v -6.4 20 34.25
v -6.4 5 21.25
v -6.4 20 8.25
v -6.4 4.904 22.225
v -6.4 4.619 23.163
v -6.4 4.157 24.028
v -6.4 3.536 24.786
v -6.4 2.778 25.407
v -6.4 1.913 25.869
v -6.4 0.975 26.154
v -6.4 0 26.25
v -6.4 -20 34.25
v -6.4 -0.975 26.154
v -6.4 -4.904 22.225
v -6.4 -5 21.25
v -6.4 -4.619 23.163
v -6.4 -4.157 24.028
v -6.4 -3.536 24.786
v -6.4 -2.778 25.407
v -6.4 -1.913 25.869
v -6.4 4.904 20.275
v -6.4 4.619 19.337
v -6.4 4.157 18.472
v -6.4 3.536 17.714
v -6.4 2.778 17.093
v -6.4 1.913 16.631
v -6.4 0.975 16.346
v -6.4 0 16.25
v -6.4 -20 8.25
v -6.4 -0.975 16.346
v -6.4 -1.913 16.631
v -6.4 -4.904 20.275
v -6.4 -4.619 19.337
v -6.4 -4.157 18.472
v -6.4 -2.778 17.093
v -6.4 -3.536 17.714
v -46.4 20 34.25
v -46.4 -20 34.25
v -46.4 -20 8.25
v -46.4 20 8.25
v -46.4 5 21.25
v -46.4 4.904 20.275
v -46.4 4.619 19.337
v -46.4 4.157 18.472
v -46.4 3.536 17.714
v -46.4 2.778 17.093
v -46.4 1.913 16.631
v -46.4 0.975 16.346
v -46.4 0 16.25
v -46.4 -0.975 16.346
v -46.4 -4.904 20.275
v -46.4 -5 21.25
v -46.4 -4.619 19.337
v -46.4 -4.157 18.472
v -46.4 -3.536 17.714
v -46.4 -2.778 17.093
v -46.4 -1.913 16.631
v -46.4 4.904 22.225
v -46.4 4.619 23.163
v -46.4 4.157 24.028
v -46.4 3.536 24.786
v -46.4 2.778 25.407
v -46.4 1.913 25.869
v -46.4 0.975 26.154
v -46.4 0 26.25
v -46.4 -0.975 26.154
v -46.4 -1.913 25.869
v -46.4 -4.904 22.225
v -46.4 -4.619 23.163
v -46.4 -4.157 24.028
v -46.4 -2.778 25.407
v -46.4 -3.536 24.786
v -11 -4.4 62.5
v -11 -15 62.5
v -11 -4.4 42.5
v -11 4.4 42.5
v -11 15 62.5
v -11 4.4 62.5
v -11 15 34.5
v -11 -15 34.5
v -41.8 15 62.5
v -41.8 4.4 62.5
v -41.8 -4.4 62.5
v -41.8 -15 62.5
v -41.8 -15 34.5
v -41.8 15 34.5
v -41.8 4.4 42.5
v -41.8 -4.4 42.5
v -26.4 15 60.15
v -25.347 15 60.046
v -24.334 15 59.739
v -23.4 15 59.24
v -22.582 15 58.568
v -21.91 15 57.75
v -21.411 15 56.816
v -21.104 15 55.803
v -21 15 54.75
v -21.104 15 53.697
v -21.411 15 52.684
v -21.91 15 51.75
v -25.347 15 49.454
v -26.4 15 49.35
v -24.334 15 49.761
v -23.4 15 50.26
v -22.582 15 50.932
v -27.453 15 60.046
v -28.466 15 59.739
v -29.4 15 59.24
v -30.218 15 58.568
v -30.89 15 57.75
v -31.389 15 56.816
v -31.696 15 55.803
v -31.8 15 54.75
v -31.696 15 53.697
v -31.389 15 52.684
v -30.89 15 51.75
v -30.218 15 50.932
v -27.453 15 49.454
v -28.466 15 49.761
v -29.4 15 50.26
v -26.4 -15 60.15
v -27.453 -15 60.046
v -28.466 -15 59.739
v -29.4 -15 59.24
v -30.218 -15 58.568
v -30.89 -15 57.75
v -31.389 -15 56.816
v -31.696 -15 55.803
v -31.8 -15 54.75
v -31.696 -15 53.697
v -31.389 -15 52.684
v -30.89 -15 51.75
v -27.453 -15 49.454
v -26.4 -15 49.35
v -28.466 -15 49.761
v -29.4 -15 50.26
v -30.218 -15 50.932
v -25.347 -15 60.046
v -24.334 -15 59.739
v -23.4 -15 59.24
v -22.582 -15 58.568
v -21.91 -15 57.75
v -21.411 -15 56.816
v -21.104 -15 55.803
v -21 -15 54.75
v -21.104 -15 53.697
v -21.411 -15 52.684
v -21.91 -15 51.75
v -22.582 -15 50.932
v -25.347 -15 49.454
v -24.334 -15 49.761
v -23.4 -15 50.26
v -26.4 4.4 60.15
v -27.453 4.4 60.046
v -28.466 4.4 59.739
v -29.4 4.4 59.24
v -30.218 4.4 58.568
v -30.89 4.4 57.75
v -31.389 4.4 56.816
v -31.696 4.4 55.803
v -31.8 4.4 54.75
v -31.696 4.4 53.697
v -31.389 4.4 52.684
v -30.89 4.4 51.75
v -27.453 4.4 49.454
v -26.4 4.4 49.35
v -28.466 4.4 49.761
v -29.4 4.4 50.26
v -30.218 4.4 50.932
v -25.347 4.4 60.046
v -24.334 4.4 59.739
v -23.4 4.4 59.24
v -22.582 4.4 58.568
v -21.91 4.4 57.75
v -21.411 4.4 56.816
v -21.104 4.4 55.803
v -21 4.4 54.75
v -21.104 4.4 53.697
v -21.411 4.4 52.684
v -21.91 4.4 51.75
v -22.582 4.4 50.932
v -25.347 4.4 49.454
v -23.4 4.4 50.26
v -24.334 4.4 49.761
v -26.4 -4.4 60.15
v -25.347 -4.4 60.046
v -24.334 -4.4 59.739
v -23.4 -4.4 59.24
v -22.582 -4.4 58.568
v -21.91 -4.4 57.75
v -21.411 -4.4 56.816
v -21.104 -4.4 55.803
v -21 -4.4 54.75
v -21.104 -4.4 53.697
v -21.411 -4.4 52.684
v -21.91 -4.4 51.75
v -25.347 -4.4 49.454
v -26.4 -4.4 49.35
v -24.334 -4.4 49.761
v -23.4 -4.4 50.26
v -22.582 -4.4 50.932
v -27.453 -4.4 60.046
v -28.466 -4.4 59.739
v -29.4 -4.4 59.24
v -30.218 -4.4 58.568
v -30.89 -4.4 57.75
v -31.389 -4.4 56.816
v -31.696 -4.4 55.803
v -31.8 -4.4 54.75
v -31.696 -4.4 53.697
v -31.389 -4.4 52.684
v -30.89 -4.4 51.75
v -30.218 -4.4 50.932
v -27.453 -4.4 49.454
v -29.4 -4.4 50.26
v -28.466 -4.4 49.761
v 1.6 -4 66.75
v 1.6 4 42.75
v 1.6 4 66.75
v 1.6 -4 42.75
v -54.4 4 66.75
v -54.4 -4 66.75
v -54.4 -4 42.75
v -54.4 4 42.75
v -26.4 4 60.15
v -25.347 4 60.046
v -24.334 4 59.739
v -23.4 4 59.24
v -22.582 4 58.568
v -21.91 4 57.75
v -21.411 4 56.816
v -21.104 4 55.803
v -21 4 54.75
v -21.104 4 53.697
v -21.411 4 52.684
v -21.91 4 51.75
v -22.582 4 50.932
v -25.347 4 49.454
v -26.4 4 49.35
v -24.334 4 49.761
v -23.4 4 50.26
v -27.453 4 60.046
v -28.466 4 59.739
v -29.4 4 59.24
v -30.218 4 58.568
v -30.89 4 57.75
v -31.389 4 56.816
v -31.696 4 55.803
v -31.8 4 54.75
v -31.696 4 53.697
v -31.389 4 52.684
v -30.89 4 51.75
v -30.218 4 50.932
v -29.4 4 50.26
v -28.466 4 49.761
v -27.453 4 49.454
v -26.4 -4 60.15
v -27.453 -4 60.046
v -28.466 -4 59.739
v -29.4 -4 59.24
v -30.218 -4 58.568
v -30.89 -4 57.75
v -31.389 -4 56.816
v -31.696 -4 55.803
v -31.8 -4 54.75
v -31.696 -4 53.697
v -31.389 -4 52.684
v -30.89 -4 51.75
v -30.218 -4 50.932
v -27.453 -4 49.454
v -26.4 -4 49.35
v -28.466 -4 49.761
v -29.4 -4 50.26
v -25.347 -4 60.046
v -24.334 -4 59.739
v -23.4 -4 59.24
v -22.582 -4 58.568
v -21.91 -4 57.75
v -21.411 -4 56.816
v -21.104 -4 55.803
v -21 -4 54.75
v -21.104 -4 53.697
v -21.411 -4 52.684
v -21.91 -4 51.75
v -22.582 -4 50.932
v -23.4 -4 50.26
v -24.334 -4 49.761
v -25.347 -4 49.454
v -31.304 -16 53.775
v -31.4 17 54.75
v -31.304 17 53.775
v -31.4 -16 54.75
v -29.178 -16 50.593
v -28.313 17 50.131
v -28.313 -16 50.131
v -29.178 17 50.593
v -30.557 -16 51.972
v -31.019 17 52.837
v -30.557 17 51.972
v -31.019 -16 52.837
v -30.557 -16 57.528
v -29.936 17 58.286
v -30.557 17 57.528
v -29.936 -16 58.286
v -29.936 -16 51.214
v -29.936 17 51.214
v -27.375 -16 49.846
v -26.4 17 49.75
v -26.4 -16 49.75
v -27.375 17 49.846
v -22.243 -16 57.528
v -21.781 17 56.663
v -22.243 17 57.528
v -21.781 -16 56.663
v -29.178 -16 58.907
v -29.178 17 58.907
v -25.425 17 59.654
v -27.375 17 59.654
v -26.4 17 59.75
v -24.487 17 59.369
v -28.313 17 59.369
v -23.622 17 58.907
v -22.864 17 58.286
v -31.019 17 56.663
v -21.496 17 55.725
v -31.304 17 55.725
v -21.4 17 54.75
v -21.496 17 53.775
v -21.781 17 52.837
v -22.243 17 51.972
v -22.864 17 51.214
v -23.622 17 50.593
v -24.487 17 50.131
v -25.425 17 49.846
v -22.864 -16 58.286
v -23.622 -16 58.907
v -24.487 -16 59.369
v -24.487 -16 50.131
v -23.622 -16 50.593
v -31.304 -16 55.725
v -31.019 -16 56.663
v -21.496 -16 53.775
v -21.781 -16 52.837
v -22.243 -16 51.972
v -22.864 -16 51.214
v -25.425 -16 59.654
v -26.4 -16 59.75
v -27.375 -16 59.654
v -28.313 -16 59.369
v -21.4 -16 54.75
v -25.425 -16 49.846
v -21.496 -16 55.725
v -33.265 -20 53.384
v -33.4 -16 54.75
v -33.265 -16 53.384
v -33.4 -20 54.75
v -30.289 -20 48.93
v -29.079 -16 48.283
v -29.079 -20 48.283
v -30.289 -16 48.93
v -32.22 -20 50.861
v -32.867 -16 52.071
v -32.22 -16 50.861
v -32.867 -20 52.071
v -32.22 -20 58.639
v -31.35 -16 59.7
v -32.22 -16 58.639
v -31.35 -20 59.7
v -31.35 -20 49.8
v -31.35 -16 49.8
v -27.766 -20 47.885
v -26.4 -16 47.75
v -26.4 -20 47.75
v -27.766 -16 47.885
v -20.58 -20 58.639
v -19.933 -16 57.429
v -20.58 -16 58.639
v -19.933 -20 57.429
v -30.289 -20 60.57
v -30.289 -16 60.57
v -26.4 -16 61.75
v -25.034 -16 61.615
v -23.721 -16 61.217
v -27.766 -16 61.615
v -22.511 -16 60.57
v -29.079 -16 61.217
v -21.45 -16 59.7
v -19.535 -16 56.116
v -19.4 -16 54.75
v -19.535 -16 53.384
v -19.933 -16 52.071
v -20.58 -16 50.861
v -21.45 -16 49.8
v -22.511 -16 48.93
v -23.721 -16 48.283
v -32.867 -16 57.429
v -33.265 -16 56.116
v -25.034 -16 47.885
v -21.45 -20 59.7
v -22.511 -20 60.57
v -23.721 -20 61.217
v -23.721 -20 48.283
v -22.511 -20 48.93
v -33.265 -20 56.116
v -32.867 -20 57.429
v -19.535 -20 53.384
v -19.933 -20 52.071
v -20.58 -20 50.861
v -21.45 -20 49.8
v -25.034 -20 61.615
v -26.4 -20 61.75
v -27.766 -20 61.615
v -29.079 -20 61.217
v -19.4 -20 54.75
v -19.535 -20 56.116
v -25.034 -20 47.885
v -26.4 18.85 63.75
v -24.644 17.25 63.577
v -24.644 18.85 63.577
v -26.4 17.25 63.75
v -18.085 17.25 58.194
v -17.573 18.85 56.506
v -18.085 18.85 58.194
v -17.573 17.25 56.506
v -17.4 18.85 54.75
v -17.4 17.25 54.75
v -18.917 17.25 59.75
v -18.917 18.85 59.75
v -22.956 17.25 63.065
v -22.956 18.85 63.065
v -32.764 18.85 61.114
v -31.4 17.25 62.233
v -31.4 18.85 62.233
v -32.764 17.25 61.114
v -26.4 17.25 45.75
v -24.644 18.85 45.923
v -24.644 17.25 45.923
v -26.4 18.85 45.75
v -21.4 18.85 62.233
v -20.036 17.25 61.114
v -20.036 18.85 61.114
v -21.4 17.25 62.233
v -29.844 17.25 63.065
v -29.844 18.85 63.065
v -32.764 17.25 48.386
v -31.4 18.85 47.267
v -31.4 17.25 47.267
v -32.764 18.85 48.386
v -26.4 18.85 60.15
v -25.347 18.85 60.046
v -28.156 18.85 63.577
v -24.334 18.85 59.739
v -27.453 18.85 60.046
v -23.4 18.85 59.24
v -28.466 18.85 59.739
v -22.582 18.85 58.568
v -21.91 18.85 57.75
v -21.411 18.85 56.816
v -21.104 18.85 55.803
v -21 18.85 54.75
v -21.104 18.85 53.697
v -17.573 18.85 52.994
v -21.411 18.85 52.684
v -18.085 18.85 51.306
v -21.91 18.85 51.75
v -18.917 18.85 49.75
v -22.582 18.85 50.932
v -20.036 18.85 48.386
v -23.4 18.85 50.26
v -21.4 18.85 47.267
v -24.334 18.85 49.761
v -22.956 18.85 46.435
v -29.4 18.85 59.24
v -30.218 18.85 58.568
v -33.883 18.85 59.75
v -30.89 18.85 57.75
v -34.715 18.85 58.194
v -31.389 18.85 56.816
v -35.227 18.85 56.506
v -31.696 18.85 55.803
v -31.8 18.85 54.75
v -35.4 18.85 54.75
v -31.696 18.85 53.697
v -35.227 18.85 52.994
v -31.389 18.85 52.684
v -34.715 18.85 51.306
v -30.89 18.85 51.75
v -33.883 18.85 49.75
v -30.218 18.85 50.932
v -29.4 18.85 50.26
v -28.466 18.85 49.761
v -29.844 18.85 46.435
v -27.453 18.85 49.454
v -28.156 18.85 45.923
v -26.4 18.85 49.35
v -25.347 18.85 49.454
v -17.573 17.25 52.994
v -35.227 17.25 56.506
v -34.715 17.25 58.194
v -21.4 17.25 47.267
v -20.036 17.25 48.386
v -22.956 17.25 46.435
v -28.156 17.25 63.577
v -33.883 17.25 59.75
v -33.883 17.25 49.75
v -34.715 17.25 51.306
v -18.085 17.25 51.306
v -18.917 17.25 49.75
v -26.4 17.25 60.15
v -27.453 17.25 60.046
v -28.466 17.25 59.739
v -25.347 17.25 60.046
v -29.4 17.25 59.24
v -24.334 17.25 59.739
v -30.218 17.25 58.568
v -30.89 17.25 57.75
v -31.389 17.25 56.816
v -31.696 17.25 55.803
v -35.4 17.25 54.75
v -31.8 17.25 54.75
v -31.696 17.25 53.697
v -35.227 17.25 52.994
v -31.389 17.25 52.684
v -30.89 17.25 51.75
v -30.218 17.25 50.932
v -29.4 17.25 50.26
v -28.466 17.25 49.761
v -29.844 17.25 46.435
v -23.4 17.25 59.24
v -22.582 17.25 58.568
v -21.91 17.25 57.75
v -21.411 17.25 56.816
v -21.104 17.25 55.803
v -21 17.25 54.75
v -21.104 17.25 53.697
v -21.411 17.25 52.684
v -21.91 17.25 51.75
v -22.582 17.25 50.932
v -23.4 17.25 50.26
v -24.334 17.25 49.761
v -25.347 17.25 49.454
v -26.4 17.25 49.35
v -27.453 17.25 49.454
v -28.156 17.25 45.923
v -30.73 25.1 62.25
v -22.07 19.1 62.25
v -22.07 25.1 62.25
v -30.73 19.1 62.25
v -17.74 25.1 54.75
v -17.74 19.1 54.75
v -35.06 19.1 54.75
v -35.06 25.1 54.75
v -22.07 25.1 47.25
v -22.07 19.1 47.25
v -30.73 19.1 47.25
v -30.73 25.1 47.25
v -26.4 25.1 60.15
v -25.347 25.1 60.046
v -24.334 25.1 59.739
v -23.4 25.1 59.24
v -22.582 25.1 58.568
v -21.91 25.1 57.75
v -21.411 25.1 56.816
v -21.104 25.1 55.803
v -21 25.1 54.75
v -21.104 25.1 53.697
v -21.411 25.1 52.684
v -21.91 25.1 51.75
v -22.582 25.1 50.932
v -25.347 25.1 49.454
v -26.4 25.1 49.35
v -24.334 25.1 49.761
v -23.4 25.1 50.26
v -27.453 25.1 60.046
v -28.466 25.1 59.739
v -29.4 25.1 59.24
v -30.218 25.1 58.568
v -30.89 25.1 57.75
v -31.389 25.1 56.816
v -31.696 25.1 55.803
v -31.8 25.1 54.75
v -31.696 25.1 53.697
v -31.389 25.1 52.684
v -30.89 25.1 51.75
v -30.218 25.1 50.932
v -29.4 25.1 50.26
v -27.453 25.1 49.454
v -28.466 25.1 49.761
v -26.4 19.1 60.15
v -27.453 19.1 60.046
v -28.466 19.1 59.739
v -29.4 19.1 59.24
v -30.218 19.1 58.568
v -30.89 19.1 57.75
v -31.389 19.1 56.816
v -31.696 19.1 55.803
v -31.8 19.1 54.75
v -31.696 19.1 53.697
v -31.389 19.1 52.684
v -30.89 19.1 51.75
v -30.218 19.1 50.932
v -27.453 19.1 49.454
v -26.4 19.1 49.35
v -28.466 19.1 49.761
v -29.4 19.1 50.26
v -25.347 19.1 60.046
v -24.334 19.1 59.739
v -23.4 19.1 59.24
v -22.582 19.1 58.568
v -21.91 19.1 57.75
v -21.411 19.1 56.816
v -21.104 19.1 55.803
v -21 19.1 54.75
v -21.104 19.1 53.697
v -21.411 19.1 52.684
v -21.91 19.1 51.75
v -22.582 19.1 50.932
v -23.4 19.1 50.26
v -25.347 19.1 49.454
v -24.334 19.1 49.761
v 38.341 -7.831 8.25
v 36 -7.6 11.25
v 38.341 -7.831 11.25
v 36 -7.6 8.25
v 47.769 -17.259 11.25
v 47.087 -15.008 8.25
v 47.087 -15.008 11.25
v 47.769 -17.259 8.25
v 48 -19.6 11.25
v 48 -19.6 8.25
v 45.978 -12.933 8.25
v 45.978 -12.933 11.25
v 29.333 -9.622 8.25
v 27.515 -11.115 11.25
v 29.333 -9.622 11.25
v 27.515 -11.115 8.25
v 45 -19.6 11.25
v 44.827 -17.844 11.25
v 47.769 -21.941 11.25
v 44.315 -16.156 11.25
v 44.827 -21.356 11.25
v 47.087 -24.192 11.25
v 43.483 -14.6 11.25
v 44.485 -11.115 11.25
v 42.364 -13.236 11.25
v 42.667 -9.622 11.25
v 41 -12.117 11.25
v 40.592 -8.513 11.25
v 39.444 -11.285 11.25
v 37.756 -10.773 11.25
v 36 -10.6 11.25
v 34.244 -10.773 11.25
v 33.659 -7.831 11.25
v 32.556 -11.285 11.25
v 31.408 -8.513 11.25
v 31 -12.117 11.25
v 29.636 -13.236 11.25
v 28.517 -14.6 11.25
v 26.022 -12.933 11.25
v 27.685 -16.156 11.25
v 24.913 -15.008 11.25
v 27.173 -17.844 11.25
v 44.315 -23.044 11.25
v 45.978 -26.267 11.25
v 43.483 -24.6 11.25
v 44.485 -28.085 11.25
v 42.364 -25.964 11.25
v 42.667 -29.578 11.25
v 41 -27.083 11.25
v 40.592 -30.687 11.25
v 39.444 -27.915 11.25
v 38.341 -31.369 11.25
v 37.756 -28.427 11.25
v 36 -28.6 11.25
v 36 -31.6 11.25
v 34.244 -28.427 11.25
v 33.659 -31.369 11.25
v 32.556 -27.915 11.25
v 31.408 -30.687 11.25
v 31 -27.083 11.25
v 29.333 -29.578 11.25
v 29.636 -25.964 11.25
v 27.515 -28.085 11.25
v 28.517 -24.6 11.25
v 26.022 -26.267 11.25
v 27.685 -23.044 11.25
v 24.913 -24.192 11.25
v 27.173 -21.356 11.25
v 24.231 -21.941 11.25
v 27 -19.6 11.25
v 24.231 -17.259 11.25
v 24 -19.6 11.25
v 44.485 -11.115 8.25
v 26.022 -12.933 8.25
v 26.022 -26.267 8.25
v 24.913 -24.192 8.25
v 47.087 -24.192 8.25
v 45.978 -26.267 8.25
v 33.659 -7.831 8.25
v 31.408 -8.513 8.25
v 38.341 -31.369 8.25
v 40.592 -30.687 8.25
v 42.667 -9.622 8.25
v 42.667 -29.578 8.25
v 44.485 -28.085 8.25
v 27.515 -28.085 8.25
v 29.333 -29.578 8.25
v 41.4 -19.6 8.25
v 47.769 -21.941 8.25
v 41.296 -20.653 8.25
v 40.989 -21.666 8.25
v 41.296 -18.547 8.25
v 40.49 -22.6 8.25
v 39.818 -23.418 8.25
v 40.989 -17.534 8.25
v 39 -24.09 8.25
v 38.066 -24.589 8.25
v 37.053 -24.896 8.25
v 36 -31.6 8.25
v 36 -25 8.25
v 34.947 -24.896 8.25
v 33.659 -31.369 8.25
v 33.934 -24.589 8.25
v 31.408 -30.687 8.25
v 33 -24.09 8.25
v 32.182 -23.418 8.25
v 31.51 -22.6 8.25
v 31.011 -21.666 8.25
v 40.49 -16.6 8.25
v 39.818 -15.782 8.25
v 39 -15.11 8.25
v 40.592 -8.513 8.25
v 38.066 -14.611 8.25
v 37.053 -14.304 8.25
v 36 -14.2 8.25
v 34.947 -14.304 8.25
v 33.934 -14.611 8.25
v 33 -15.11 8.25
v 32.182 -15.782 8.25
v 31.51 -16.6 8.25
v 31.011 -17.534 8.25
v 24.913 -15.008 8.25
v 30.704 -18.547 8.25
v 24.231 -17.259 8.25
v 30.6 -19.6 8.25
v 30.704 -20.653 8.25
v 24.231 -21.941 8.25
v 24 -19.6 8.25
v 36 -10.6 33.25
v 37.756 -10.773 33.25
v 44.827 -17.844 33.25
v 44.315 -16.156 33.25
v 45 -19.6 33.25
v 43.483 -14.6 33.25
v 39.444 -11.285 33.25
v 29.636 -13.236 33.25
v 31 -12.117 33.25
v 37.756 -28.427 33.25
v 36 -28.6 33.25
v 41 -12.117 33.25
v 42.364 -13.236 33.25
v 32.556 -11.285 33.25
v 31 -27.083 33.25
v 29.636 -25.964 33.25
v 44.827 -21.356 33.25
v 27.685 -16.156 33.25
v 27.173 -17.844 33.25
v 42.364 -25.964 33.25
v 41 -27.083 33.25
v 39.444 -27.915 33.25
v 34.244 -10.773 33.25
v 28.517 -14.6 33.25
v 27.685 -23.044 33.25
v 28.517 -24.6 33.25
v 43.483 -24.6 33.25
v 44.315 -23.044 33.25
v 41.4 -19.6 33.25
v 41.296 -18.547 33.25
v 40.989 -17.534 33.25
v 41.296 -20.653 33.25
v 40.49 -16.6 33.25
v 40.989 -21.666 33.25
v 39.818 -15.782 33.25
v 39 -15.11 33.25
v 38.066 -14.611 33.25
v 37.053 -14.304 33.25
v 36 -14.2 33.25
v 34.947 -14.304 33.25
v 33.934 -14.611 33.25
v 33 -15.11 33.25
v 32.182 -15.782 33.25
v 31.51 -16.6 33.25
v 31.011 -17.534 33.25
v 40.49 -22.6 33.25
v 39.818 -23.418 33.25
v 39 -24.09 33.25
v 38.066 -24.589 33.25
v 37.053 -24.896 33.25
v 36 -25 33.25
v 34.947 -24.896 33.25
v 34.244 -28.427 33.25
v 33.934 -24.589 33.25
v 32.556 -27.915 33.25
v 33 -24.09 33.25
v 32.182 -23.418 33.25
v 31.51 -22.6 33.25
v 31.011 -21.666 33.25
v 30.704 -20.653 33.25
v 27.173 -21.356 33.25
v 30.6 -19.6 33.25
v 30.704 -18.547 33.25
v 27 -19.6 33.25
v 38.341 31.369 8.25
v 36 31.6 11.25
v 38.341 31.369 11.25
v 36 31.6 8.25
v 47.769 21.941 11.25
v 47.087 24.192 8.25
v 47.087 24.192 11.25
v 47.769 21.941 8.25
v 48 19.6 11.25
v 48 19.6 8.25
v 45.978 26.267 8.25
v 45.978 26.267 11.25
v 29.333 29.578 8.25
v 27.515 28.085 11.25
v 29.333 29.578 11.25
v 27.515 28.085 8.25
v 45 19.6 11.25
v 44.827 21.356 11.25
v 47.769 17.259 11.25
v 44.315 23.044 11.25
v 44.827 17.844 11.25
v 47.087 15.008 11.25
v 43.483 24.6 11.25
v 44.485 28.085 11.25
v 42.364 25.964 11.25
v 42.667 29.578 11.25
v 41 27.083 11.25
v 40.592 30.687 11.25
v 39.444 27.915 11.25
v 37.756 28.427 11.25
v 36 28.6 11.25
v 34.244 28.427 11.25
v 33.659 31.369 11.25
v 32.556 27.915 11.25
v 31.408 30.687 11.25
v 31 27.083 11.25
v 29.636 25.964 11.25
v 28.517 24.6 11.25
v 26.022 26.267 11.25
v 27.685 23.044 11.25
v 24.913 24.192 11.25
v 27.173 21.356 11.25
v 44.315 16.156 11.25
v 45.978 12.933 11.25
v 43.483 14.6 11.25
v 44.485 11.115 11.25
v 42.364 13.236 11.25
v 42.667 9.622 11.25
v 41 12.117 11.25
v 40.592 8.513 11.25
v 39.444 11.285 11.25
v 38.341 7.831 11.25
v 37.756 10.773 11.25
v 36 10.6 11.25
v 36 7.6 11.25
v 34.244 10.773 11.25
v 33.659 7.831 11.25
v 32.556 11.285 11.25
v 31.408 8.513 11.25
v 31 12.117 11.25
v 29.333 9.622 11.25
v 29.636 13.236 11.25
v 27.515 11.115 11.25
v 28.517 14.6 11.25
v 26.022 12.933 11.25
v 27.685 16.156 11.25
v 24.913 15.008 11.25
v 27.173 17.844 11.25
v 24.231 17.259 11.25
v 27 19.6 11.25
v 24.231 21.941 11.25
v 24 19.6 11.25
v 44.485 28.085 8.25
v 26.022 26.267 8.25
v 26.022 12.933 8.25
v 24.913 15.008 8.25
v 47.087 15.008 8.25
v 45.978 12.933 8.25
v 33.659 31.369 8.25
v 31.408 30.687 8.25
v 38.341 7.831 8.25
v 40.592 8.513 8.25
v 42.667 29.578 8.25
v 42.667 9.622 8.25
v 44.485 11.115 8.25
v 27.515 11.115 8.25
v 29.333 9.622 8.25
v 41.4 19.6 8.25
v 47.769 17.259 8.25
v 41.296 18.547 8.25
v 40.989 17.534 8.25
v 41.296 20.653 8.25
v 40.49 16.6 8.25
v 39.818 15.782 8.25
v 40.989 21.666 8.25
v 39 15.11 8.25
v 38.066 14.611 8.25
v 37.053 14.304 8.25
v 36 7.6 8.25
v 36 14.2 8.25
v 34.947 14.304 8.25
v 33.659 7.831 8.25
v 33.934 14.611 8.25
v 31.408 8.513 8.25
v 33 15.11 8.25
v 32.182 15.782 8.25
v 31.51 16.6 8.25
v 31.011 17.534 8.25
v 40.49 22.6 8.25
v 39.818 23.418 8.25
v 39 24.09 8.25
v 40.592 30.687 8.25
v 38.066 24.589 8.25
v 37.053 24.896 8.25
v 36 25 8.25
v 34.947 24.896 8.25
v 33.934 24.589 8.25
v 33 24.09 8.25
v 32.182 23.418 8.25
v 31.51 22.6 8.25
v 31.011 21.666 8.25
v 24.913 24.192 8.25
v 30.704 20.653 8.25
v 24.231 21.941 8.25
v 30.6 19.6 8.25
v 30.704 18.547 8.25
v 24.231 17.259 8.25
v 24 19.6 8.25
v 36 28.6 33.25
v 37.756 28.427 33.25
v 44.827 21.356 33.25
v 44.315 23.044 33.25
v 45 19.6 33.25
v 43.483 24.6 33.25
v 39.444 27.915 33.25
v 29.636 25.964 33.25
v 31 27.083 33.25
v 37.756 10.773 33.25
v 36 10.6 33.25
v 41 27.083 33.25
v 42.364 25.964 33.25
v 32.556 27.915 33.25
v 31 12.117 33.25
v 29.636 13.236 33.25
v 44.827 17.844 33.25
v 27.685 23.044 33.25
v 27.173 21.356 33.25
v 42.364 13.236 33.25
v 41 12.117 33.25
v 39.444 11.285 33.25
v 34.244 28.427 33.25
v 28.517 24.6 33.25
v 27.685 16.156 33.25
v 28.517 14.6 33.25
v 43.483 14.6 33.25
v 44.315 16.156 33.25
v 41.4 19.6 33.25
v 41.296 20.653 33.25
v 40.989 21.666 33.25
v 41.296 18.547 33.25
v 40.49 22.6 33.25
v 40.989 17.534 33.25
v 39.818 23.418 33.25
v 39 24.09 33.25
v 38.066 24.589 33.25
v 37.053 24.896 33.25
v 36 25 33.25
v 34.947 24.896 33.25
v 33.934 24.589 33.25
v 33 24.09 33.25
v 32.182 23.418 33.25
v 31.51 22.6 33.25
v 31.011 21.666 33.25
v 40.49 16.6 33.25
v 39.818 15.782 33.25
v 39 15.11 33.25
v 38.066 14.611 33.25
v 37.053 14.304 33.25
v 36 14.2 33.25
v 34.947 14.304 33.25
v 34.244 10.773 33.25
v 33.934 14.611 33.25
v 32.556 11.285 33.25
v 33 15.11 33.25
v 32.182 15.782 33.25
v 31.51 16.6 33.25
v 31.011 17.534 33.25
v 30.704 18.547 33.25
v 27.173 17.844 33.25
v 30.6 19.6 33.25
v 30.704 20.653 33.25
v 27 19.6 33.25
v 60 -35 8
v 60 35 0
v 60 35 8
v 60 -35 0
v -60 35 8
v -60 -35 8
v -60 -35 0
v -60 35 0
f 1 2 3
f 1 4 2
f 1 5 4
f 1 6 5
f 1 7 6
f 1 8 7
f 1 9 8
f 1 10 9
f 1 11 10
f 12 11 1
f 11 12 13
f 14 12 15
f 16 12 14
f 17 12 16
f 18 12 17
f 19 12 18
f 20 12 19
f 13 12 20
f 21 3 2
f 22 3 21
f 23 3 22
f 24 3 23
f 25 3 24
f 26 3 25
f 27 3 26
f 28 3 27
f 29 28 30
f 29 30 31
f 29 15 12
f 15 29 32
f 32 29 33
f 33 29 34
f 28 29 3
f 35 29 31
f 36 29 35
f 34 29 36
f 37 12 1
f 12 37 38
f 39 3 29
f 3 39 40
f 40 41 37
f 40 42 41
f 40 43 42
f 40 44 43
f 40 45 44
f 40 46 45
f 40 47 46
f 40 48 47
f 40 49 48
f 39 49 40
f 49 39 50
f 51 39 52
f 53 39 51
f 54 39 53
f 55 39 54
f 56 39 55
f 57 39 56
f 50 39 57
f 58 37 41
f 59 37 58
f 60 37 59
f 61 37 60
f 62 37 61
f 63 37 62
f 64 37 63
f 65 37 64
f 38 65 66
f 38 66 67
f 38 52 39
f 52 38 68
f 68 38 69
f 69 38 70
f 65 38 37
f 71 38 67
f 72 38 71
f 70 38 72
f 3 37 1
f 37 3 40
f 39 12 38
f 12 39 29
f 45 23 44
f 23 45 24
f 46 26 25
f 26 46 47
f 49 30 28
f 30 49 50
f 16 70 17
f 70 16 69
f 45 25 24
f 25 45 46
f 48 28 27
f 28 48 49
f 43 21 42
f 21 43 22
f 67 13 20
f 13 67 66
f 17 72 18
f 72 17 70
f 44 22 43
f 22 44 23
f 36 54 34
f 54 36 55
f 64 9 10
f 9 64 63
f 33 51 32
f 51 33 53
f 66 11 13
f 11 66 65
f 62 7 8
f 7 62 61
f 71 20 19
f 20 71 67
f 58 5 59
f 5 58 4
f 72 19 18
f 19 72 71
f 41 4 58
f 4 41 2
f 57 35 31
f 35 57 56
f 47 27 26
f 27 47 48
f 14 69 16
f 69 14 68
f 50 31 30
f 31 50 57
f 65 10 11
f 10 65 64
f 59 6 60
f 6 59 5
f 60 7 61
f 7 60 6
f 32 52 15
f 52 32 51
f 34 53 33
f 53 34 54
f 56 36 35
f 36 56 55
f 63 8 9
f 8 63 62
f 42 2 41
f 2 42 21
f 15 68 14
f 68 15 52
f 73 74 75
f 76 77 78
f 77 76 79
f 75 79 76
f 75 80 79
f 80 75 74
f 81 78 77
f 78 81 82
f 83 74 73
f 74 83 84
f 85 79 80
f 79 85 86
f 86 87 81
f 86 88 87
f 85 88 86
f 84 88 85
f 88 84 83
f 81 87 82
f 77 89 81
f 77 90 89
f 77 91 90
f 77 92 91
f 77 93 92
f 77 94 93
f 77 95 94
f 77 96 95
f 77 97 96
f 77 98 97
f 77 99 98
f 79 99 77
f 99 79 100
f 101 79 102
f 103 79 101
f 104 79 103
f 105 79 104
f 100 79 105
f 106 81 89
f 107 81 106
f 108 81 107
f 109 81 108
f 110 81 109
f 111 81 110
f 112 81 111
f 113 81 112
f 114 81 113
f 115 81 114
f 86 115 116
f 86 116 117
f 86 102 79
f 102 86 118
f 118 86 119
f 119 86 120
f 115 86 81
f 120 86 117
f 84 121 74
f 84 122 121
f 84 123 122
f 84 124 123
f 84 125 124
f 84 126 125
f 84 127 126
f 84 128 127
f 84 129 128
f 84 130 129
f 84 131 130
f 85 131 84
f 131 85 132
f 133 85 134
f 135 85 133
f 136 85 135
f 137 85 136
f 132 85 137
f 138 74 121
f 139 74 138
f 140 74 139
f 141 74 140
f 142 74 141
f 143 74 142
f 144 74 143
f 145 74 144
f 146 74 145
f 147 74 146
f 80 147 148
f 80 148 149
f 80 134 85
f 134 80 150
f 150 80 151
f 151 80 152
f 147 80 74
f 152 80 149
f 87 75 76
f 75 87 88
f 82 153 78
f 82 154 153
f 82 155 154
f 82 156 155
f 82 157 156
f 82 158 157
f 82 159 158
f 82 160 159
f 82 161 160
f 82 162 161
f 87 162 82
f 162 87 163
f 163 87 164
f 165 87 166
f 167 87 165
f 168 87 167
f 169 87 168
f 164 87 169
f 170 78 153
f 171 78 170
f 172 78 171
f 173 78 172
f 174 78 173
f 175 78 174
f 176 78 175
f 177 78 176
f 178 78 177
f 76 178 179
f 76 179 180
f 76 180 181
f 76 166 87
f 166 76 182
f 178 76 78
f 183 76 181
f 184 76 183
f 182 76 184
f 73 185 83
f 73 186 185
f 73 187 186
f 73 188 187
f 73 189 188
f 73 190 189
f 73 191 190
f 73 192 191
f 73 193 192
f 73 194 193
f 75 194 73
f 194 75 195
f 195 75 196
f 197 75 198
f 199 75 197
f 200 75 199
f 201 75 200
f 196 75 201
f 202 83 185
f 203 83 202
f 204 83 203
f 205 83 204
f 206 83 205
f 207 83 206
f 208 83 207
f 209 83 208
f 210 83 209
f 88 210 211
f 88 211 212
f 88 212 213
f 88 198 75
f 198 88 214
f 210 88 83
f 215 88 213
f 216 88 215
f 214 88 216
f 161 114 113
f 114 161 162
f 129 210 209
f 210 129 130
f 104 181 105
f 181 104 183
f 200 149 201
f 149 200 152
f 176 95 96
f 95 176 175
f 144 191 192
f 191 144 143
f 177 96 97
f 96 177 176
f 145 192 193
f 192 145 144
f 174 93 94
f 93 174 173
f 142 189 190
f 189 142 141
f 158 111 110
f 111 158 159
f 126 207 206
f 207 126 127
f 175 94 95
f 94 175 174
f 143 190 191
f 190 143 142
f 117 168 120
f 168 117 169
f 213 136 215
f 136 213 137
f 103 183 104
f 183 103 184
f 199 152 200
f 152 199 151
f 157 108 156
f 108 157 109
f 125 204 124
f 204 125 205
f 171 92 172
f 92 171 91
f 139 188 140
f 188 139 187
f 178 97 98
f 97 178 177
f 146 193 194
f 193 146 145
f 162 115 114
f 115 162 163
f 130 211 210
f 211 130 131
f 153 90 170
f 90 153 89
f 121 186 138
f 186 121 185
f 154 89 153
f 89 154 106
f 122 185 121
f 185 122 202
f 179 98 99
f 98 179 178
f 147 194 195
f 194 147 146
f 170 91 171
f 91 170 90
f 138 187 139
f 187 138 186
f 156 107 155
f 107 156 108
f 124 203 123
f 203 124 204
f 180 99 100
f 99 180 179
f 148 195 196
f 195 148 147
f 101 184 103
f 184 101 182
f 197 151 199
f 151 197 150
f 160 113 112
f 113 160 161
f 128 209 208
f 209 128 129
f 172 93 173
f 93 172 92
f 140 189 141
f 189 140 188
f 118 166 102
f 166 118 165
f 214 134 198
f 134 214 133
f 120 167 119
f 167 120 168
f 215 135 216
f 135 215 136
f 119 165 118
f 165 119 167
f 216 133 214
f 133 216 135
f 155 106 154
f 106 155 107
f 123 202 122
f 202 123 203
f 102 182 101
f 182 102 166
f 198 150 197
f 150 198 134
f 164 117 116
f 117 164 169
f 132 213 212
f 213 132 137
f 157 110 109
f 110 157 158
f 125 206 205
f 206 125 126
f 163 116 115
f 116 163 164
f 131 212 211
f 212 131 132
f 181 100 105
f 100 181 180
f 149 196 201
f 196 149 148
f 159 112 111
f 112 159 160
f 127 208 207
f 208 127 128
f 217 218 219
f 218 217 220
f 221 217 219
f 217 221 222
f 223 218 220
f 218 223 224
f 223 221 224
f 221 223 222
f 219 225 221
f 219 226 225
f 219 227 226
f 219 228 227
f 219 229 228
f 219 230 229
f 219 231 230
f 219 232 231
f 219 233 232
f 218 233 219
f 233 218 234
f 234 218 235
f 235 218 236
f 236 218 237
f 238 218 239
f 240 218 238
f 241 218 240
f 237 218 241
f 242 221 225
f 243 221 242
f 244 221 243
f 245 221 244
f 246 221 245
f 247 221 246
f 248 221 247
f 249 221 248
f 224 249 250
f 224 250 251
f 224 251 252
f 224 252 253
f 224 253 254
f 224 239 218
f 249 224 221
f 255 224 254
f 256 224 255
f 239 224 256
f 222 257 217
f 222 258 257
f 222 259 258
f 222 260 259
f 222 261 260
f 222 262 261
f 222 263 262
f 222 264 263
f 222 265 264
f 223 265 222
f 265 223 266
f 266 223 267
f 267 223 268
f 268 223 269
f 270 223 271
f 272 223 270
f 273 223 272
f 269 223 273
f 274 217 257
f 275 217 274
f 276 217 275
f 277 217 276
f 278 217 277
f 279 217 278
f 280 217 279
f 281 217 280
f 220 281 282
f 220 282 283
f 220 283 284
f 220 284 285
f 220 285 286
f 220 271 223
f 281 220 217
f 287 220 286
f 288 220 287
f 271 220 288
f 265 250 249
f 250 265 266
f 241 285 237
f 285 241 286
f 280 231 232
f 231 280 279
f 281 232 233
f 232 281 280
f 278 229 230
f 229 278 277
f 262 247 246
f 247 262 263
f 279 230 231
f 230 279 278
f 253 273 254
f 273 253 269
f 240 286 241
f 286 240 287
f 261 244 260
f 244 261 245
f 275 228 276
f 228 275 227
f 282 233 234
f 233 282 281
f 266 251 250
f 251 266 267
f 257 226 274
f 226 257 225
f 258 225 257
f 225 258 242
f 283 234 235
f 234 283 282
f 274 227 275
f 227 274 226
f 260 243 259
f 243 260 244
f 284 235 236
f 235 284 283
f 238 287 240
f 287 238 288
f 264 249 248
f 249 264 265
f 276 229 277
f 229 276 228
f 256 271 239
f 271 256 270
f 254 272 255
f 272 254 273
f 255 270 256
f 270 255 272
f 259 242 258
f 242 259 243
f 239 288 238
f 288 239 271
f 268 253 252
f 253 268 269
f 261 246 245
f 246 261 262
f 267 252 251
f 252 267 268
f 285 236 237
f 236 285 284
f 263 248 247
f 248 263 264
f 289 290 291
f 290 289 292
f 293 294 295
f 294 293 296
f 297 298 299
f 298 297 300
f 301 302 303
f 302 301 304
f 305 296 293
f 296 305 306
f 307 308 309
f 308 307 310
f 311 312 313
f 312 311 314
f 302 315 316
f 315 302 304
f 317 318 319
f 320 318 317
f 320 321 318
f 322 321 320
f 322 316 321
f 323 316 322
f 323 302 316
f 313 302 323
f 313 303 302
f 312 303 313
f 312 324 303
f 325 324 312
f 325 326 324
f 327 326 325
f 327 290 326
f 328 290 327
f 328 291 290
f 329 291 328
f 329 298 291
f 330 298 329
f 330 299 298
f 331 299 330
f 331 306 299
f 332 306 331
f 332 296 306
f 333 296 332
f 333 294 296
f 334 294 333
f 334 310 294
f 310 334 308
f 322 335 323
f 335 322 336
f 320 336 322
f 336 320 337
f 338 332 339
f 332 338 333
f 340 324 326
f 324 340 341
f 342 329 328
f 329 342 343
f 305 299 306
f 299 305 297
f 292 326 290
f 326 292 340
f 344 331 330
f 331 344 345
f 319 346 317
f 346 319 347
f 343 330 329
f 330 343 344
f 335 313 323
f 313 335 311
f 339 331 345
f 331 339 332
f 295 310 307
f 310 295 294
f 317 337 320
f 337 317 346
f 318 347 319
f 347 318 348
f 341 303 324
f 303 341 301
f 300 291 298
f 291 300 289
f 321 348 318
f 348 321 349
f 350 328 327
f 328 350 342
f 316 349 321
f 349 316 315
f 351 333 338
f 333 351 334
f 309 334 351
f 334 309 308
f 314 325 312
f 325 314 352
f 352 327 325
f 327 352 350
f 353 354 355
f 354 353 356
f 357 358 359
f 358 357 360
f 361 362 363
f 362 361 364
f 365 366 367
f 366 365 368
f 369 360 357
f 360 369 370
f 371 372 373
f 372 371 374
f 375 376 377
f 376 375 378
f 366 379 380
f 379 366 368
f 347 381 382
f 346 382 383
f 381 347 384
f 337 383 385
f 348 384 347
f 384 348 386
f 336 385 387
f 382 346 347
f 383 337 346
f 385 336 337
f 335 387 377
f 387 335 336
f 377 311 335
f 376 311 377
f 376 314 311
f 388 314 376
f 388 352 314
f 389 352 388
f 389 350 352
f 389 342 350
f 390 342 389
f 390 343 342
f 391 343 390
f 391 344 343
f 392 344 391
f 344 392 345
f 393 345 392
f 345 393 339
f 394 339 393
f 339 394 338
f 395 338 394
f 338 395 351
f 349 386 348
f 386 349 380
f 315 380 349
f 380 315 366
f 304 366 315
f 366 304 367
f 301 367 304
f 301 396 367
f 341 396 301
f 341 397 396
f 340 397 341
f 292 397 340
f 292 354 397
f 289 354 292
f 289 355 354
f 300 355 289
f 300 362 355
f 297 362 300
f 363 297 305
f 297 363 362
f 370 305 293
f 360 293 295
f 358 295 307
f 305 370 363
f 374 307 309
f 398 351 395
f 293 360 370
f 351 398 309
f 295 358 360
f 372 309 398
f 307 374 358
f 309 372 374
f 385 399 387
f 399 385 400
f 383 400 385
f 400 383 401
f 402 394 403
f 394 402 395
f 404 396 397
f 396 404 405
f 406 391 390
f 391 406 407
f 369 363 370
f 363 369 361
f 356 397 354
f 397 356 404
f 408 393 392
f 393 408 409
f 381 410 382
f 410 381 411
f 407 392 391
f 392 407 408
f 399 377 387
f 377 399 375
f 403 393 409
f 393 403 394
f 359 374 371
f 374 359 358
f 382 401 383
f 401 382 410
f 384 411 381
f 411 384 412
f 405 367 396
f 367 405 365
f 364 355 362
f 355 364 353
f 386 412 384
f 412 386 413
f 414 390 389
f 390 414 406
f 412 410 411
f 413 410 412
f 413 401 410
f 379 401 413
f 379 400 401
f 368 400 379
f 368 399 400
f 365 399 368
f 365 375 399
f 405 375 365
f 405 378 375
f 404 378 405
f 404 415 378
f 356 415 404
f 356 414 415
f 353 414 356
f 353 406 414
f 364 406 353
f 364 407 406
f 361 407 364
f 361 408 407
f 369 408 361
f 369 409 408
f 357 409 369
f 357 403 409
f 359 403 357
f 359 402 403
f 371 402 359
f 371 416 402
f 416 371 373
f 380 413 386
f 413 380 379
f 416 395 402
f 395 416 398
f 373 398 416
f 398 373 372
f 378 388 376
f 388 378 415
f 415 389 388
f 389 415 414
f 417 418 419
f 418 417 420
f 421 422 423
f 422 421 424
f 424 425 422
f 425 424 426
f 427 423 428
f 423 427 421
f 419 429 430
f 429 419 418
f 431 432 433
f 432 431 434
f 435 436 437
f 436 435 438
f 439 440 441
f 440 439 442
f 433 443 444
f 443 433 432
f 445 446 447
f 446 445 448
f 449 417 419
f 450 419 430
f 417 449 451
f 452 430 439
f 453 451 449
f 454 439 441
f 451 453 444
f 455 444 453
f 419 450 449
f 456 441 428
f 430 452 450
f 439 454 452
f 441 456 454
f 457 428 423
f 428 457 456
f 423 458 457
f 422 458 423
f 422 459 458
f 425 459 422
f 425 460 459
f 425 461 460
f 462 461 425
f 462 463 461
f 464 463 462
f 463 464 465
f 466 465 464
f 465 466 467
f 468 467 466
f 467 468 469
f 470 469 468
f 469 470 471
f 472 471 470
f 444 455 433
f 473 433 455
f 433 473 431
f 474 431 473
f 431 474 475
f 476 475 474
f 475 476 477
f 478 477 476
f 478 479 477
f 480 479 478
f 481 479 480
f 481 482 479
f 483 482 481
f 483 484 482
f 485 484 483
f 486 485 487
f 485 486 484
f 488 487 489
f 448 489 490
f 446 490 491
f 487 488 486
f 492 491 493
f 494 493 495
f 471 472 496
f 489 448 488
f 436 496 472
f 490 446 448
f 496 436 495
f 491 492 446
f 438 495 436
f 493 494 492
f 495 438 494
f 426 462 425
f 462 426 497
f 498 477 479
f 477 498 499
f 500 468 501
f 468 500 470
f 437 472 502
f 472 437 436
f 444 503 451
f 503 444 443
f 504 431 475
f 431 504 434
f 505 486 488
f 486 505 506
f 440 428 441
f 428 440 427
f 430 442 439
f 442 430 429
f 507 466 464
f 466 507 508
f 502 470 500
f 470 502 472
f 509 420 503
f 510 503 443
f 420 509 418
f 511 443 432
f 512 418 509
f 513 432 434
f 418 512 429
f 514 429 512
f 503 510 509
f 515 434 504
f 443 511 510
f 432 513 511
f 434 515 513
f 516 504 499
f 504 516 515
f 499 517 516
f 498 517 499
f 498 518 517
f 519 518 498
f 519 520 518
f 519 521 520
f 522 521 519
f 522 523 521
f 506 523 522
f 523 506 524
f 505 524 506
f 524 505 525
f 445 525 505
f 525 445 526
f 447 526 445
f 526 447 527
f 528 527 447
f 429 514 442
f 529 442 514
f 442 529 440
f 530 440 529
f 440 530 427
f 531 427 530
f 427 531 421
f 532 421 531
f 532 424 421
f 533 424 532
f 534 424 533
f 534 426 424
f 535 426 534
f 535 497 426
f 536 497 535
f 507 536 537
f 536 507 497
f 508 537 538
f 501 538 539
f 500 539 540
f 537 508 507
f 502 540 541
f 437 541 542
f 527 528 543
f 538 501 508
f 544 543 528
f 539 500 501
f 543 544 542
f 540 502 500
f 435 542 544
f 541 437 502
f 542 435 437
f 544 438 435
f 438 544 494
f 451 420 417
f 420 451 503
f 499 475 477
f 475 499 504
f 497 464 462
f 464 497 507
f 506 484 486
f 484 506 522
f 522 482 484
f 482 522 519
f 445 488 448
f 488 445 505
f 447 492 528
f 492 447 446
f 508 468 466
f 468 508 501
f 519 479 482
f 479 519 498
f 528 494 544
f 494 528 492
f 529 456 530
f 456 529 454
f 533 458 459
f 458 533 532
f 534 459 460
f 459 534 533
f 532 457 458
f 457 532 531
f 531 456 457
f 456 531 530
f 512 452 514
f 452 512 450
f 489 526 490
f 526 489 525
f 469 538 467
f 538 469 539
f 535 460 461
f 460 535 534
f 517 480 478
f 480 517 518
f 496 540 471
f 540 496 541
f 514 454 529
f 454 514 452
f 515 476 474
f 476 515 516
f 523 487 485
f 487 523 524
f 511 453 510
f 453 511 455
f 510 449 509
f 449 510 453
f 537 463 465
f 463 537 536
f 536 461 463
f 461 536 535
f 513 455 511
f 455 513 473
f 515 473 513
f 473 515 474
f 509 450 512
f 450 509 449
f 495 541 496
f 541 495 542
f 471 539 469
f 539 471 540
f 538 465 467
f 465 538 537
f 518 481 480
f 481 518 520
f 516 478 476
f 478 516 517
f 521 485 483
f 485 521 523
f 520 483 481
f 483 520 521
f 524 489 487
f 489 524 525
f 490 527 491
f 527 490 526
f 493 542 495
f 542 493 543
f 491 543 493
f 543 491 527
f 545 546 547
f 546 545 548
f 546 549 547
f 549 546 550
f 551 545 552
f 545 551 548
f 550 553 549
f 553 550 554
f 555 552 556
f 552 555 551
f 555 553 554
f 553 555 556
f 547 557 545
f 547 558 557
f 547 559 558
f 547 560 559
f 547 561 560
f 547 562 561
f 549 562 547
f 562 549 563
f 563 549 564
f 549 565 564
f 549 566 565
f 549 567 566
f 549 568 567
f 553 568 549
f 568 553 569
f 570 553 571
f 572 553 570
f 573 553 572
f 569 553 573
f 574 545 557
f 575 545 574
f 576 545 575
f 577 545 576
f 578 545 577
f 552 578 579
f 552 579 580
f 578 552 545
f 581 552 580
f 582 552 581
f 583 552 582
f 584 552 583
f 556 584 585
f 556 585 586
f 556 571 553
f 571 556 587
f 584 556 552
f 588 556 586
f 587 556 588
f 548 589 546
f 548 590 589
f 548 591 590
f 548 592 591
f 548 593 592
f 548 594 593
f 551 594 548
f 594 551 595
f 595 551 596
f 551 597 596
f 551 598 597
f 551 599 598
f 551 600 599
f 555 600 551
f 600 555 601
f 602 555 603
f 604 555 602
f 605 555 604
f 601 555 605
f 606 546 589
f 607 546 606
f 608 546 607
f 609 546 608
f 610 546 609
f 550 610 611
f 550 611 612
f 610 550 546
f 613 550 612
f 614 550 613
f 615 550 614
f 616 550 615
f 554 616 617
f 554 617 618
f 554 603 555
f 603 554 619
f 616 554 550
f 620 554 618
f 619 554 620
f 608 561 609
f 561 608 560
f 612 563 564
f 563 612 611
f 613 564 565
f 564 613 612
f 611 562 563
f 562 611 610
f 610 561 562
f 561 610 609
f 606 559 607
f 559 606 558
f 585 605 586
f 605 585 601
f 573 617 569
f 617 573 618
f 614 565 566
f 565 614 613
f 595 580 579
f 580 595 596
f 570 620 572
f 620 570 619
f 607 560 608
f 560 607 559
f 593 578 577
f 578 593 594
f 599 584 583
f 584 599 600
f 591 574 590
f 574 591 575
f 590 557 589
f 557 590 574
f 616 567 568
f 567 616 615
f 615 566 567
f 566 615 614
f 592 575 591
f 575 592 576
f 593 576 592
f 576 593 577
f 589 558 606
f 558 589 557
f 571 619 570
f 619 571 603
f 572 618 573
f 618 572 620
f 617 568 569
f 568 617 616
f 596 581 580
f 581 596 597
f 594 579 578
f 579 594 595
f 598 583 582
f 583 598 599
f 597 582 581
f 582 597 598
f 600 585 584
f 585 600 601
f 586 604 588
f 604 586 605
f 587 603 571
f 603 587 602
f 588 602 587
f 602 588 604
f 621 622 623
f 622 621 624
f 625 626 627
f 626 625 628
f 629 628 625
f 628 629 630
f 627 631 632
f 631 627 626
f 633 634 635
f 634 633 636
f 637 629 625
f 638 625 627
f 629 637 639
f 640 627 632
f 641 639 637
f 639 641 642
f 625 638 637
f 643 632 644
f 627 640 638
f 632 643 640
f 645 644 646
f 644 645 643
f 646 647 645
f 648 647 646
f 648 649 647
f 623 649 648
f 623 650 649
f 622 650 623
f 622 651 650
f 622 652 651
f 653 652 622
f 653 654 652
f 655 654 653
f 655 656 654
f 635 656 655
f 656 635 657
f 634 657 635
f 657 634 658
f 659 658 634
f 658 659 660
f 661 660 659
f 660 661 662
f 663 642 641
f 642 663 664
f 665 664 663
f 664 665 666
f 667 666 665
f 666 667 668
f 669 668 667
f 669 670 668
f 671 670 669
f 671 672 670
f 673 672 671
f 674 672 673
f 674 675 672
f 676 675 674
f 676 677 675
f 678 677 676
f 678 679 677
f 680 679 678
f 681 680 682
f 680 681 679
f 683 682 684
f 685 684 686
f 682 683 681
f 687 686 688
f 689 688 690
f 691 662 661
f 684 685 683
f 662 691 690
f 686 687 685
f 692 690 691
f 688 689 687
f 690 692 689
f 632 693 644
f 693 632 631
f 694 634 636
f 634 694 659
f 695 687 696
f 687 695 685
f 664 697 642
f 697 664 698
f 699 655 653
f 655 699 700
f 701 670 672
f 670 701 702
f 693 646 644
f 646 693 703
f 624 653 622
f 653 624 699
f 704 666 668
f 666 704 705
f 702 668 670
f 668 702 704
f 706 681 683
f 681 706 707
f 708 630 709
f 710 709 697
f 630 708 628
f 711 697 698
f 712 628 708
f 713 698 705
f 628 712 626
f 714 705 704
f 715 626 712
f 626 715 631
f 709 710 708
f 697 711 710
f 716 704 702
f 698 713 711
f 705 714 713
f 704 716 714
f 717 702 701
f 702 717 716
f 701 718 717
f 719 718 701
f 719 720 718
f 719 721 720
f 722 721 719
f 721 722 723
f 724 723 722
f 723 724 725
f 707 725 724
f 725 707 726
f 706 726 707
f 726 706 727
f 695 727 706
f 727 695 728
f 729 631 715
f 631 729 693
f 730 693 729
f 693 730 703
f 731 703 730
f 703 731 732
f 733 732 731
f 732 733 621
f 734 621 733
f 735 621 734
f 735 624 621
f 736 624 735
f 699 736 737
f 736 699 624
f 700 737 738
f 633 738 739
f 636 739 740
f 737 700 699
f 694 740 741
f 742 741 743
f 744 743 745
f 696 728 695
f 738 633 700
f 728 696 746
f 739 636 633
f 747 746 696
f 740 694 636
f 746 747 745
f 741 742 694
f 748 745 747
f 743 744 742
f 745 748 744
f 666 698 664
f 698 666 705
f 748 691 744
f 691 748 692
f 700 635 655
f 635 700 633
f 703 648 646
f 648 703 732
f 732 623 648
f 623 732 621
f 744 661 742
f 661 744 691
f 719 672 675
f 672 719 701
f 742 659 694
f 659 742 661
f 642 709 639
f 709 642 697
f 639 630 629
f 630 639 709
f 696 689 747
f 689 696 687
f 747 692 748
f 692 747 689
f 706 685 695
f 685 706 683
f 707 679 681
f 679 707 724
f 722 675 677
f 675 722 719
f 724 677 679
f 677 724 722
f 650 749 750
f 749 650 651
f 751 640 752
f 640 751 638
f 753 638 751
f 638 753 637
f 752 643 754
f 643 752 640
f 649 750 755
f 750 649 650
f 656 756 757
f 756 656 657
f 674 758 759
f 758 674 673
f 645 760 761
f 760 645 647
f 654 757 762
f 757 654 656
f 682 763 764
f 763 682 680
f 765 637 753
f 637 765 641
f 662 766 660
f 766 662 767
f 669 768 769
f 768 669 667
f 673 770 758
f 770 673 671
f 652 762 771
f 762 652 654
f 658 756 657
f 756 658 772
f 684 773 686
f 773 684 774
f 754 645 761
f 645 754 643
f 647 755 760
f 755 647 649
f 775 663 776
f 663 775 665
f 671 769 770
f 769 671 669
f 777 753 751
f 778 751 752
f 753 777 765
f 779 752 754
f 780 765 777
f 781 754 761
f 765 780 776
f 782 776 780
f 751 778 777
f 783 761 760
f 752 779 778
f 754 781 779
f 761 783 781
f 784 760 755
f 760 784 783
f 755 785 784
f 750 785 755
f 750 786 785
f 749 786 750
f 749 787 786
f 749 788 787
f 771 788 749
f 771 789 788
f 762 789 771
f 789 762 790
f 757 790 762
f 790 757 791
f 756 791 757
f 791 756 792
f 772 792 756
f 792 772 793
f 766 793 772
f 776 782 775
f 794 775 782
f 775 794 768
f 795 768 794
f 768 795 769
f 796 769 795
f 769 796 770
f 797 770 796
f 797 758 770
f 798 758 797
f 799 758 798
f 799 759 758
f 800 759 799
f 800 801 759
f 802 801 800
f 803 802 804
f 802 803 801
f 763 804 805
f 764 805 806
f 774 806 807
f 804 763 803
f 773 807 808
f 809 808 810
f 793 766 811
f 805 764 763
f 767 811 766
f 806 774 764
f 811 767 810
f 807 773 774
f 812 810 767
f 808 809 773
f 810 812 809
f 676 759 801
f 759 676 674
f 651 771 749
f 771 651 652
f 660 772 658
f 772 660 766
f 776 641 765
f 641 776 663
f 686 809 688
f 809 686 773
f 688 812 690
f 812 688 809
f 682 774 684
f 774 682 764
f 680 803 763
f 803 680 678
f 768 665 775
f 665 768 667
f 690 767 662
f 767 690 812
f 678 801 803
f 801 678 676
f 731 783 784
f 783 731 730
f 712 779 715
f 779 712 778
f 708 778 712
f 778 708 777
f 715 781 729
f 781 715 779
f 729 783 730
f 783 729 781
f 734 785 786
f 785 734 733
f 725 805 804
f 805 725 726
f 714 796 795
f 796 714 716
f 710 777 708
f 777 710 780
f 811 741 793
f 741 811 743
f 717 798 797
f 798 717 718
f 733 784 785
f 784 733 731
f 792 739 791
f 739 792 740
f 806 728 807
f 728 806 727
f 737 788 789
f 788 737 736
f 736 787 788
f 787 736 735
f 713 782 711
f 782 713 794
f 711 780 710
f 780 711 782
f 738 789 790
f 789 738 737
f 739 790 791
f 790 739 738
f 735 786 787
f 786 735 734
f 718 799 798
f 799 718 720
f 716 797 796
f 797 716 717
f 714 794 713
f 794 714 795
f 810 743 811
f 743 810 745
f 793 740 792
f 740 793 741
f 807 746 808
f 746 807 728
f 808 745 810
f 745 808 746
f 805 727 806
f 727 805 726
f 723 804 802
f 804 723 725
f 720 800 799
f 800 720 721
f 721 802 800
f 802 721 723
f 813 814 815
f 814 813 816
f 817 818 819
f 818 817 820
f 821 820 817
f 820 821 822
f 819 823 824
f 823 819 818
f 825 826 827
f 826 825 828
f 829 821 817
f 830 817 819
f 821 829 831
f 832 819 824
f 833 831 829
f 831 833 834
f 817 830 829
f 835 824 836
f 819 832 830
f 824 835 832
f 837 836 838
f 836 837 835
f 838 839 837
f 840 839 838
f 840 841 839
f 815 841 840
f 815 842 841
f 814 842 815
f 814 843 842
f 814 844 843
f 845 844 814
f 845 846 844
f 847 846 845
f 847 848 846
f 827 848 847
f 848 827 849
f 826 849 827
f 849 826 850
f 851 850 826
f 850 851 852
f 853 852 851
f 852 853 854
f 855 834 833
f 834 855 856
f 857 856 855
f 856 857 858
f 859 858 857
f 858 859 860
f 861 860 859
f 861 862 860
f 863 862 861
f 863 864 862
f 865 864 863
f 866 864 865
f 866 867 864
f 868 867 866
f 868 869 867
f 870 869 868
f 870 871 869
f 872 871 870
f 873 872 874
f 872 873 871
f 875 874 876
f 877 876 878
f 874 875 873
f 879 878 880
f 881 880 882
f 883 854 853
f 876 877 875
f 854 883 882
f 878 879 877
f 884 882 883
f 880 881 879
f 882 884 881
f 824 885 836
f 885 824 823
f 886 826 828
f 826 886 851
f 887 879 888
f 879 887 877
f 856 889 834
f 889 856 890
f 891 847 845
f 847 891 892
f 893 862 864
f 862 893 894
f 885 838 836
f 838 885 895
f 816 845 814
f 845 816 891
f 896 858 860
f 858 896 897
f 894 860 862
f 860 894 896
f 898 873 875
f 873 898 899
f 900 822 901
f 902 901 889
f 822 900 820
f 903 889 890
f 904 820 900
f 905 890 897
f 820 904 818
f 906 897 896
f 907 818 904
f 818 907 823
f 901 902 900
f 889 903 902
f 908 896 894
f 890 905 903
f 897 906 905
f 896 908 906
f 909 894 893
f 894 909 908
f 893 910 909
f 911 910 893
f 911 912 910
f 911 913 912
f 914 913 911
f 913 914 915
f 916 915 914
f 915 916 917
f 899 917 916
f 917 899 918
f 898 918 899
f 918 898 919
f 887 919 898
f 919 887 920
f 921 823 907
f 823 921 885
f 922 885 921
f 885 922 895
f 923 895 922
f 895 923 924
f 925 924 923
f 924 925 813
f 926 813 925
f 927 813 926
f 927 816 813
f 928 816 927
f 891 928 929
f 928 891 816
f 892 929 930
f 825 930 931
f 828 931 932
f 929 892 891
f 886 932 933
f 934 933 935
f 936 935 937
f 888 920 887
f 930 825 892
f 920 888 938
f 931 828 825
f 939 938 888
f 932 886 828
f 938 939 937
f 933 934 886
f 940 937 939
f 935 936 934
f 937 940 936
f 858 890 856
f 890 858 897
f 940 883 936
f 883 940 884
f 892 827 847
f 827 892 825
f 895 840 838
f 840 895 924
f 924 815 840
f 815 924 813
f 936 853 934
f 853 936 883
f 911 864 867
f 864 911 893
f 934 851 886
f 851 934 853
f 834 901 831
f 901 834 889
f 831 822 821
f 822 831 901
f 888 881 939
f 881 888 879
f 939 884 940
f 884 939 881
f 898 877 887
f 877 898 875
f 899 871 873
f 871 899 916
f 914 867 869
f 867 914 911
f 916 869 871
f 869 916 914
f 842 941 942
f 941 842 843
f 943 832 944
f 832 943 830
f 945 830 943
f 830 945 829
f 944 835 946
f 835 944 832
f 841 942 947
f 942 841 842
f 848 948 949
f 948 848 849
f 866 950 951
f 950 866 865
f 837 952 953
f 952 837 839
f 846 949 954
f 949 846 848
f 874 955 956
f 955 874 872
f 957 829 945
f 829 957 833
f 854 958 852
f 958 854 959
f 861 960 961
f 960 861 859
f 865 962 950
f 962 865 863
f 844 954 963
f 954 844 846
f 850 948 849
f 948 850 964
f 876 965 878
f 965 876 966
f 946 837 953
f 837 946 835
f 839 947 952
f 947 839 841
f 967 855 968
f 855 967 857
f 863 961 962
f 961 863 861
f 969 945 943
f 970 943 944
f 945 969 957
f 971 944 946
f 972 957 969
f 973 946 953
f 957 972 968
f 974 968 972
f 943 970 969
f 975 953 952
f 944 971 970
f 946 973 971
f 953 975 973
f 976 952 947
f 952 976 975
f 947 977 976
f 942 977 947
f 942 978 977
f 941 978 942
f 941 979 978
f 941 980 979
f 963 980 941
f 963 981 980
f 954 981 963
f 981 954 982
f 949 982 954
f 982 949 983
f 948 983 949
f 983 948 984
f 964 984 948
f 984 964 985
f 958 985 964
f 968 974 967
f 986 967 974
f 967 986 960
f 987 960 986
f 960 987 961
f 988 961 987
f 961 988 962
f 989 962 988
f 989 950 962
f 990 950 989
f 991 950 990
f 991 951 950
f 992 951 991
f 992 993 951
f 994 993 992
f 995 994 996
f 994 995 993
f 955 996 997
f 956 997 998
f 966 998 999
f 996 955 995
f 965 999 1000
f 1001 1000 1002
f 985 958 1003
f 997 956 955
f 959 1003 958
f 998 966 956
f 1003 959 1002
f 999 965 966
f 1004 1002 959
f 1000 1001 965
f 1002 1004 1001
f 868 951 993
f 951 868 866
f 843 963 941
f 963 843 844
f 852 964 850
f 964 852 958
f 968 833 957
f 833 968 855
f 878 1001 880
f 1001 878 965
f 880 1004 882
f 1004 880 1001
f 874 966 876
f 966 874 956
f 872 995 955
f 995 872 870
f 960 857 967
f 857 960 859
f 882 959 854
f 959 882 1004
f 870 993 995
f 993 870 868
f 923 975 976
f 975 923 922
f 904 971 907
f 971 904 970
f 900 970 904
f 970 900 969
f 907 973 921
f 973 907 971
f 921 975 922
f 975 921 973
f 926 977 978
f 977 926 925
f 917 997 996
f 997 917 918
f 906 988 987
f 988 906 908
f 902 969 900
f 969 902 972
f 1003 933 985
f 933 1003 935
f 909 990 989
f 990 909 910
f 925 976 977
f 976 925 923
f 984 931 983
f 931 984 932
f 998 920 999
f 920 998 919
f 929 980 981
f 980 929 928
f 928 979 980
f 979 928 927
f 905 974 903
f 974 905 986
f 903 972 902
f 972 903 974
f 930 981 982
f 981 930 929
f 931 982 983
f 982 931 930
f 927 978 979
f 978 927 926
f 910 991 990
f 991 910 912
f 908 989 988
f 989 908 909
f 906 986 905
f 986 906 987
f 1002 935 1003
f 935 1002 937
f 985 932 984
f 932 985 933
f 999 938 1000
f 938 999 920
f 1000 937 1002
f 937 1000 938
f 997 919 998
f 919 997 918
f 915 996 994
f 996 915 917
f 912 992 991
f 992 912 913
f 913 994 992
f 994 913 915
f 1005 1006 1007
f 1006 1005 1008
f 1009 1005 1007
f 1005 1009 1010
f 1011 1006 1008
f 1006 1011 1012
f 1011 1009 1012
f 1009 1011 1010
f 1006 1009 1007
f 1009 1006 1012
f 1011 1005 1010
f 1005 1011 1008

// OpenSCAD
$fn = 32;

// ------------------------------------------------------------------------
// Indexing jig: plate 120 x 70 mm, pin d10
// Every part is its own module, assembly() places every instance.
// ------------------------------------------------------------------------

// --- part 1 ---
module jig_plate() {
  difference() {
    translate([-60, -35, 0]) cube([120, 70, 8]);
  }
}

// --- part 2 ---
module locator_block() {
  difference() {
    translate([-20, -20, 0]) cube([40, 40, 26]);
    translate([0, 0, 13]) rotate([0, 90, 0]) cylinder(h = 42, d = 10, center = true);
  }
}

// --- part 3 ---
module index_fork() {
  difference() {
    translate([-15.4, -15, 0]) cube([30.8, 30, 28]);
    translate([-16.4, -4.4, 8]) cube([32.8, 8.8, 21]);
    translate([0, 0, 20.25]) rotate([90, 0, 0]) cylinder(h = 32, d = 10.8, center = true);
  }
}

// --- part 4 ---
module index_arm() {
  difference() {
    translate([-28, -4, 0]) cube([56, 8, 24]);
    translate([0, 0, 12]) rotate([90, 0, 0]) cylinder(h = 10, d = 10.8, center = true);
  }
}

// --- part 5 ---
module index_pin() {
  rotate([0, 90, 0]) cylinder(h = 34, d = 10, center = true);
  translate([-20, 0, 0]) rotate([0, 90, 0]) cylinder(h = 4, d = 14);
}

// --- part 6 ---
module pin_washer() {
  difference() {
      translate([0, 0, 0]) cylinder(h = 1.6, d = 18);
      translate([0, 0, -1]) cylinder(h = 3.6, d = 10.8);
    }
}

// --- part 7 ---
module lock_nut() {
  difference() {
    linear_extrude(height = 6) polygon(points = [[8.66, 0], [4.33, 7.5], [-4.33, 7.5], [-8.66, 0], [-4.33, -7.5], [4.33, -7.5]]);
    translate([0, 0, -1]) cylinder(h = 8, d = 10.8);
  }
}

// --- part 8 ---
module guide_bush_a() {
  difference() {
    union() {
      cylinder(h = 3, d = 24);
      translate([0, 0, 3]) cylinder(h = 22, d = 18);
    }
    translate([0, 0, -1]) cylinder(h = 27, d = 10.8);
  }
}

// --- part 9 ---
module guide_bush_b() {
  difference() {
    union() {
      cylinder(h = 3, d = 24);
      translate([0, 0, 3]) cylinder(h = 22, d = 18);
    }
    translate([0, 0, -1]) cylinder(h = 27, d = 10.8);
  }
}

// --- assembly ---
module assembly() {
  color([0.80, 0.24, 0.20]) translate([0, 0, 0]) rotate([0, 0, 0]) jig_plate();
  color([0.20, 0.45, 0.75]) translate([-26.4, 0, 8.25]) rotate([0, 0, 0]) locator_block();
  color([0.25, 0.62, 0.32]) translate([-26.4, 0, 34.5]) rotate([0, 0, 0]) index_fork();
  color([0.92, 0.70, 0.18]) translate([-26.4, 0, 42.75]) rotate([0, 0, 0]) index_arm();
  color([0.58, 0.35, 0.70]) translate([-26.4, 0, 54.75]) rotate([0, 0, 90]) index_pin();
  color([0.16, 0.66, 0.66]) translate([-26.4, 18.85, 54.75]) rotate([90, 0, 0]) pin_washer();
  color([0.85, 0.48, 0.18]) translate([-26.4, 25.1, 54.75]) rotate([90, 0, 0]) lock_nut();
  color([0.55, 0.60, 0.65]) translate([36, -19.6, 8.25]) rotate([0, 0, 0]) guide_bush_a();
  color([0.75, 0.30, 0.55]) translate([36, 19.6, 8.25]) rotate([0, 0, 0]) guide_bush_b();
}

assembly();
